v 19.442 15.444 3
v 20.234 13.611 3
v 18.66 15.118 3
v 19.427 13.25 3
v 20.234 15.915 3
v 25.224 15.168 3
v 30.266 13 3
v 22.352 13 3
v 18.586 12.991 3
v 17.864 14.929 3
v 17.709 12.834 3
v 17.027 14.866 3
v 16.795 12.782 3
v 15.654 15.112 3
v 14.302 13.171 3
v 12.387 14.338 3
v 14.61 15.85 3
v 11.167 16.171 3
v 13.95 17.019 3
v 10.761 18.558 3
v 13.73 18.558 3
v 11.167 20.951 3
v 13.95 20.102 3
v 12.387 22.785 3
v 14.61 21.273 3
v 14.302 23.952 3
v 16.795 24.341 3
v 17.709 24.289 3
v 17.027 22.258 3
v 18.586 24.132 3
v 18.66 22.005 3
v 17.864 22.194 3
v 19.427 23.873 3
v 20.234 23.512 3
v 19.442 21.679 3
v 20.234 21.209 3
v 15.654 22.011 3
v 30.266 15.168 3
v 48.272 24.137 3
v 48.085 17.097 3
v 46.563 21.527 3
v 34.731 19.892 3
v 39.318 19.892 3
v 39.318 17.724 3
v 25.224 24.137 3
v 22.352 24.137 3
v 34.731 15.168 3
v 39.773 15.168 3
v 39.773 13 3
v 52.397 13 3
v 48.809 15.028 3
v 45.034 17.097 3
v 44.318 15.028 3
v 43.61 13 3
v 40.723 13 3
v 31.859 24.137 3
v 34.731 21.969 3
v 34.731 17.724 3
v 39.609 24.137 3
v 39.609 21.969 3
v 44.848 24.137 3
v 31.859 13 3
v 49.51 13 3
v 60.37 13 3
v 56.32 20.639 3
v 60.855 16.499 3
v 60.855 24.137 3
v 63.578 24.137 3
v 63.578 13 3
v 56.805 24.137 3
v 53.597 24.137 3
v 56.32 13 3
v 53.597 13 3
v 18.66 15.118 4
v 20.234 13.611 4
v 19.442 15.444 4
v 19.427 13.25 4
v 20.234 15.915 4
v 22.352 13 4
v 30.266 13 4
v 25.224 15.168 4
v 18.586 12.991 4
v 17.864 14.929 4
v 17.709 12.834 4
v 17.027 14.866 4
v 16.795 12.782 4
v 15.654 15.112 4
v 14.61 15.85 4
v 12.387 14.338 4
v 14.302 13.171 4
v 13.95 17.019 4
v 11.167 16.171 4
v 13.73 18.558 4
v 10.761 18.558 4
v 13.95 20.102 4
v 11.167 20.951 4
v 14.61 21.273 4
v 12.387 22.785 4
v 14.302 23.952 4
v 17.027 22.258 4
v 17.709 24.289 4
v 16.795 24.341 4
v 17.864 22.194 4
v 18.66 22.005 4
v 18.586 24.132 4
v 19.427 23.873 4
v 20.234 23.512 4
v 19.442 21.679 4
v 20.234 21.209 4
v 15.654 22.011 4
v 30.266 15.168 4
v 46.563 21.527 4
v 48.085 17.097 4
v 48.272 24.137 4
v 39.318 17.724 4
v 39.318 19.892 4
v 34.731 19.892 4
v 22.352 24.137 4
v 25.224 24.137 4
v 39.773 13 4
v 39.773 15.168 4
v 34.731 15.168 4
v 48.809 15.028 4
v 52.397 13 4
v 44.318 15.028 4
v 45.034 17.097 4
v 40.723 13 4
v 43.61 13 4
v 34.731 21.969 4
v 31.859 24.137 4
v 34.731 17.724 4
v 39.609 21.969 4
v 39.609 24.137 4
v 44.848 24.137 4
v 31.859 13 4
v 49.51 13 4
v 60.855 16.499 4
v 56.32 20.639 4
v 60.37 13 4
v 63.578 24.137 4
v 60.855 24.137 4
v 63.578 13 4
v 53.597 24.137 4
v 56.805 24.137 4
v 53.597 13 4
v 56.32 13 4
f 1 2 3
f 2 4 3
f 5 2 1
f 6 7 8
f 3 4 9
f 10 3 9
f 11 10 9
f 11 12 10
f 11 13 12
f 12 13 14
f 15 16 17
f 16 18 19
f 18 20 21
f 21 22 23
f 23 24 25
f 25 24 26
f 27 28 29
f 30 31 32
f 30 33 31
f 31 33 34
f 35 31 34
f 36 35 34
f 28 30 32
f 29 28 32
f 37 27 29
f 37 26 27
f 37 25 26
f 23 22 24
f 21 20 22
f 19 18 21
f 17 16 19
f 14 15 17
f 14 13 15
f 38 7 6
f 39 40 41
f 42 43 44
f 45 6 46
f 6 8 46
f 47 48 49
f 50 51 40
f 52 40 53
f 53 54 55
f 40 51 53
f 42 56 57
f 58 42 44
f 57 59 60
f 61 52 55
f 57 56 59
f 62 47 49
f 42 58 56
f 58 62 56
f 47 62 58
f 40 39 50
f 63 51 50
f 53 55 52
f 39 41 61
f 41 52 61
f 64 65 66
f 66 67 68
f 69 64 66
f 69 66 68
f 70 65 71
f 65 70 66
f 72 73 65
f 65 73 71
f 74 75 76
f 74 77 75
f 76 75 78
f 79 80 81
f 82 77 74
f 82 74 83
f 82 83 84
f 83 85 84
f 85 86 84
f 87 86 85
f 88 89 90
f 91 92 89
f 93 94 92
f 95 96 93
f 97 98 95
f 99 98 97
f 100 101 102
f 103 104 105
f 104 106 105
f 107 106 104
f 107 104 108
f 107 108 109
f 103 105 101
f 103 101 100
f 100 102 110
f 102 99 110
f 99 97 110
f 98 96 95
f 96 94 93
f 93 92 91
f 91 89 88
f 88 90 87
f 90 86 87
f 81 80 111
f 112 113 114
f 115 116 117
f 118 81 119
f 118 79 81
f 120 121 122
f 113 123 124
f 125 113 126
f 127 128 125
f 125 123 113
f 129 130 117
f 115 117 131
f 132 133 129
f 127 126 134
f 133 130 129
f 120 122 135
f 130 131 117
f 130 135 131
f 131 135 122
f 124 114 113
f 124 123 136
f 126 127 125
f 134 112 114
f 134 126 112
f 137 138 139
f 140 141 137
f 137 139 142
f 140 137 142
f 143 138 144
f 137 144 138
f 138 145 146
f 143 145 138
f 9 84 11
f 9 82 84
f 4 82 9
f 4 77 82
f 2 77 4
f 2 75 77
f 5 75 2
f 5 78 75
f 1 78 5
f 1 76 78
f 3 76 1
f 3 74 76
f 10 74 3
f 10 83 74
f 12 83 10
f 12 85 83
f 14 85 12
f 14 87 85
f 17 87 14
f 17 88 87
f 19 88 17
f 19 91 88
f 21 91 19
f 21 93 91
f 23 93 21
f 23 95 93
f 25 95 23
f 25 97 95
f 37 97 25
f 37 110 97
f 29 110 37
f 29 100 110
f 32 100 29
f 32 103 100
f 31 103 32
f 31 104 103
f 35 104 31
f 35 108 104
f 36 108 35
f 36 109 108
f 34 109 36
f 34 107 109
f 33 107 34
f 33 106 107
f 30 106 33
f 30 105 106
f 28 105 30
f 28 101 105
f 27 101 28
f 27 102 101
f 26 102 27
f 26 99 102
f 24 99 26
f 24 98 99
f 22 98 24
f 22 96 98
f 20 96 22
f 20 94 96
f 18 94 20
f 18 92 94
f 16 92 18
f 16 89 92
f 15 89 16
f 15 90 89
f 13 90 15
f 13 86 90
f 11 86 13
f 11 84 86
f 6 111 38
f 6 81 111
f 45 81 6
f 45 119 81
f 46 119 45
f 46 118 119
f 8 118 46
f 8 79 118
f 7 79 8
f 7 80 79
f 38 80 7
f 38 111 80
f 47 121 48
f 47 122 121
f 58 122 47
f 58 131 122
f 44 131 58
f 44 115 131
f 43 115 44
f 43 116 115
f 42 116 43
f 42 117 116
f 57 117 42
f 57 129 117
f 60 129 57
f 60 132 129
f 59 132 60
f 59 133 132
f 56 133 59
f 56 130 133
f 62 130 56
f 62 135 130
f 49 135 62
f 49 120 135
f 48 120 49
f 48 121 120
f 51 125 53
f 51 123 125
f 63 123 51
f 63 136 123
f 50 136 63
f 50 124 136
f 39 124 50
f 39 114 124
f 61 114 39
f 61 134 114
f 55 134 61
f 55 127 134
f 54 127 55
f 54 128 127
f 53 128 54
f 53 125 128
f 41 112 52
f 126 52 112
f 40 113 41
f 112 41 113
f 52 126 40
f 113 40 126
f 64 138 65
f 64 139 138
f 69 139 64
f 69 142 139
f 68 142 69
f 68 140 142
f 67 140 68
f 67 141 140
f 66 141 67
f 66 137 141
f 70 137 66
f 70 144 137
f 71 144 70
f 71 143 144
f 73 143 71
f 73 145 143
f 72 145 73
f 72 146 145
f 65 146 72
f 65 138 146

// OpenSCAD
// oppvaskmaskinskilt, bakgrunn
//fn=$preview?16:256;
fn=8;
$fn=fn;

text="DISHES";
font="Copperplate:style=Bold";

text_clean="CLEAN";
text_dirty="DIRTY";

translate([10,13,3]) {
    linear_extrude(1) {
        text(text_clean, font=font, size=11, $fn=fn);
    }
}
